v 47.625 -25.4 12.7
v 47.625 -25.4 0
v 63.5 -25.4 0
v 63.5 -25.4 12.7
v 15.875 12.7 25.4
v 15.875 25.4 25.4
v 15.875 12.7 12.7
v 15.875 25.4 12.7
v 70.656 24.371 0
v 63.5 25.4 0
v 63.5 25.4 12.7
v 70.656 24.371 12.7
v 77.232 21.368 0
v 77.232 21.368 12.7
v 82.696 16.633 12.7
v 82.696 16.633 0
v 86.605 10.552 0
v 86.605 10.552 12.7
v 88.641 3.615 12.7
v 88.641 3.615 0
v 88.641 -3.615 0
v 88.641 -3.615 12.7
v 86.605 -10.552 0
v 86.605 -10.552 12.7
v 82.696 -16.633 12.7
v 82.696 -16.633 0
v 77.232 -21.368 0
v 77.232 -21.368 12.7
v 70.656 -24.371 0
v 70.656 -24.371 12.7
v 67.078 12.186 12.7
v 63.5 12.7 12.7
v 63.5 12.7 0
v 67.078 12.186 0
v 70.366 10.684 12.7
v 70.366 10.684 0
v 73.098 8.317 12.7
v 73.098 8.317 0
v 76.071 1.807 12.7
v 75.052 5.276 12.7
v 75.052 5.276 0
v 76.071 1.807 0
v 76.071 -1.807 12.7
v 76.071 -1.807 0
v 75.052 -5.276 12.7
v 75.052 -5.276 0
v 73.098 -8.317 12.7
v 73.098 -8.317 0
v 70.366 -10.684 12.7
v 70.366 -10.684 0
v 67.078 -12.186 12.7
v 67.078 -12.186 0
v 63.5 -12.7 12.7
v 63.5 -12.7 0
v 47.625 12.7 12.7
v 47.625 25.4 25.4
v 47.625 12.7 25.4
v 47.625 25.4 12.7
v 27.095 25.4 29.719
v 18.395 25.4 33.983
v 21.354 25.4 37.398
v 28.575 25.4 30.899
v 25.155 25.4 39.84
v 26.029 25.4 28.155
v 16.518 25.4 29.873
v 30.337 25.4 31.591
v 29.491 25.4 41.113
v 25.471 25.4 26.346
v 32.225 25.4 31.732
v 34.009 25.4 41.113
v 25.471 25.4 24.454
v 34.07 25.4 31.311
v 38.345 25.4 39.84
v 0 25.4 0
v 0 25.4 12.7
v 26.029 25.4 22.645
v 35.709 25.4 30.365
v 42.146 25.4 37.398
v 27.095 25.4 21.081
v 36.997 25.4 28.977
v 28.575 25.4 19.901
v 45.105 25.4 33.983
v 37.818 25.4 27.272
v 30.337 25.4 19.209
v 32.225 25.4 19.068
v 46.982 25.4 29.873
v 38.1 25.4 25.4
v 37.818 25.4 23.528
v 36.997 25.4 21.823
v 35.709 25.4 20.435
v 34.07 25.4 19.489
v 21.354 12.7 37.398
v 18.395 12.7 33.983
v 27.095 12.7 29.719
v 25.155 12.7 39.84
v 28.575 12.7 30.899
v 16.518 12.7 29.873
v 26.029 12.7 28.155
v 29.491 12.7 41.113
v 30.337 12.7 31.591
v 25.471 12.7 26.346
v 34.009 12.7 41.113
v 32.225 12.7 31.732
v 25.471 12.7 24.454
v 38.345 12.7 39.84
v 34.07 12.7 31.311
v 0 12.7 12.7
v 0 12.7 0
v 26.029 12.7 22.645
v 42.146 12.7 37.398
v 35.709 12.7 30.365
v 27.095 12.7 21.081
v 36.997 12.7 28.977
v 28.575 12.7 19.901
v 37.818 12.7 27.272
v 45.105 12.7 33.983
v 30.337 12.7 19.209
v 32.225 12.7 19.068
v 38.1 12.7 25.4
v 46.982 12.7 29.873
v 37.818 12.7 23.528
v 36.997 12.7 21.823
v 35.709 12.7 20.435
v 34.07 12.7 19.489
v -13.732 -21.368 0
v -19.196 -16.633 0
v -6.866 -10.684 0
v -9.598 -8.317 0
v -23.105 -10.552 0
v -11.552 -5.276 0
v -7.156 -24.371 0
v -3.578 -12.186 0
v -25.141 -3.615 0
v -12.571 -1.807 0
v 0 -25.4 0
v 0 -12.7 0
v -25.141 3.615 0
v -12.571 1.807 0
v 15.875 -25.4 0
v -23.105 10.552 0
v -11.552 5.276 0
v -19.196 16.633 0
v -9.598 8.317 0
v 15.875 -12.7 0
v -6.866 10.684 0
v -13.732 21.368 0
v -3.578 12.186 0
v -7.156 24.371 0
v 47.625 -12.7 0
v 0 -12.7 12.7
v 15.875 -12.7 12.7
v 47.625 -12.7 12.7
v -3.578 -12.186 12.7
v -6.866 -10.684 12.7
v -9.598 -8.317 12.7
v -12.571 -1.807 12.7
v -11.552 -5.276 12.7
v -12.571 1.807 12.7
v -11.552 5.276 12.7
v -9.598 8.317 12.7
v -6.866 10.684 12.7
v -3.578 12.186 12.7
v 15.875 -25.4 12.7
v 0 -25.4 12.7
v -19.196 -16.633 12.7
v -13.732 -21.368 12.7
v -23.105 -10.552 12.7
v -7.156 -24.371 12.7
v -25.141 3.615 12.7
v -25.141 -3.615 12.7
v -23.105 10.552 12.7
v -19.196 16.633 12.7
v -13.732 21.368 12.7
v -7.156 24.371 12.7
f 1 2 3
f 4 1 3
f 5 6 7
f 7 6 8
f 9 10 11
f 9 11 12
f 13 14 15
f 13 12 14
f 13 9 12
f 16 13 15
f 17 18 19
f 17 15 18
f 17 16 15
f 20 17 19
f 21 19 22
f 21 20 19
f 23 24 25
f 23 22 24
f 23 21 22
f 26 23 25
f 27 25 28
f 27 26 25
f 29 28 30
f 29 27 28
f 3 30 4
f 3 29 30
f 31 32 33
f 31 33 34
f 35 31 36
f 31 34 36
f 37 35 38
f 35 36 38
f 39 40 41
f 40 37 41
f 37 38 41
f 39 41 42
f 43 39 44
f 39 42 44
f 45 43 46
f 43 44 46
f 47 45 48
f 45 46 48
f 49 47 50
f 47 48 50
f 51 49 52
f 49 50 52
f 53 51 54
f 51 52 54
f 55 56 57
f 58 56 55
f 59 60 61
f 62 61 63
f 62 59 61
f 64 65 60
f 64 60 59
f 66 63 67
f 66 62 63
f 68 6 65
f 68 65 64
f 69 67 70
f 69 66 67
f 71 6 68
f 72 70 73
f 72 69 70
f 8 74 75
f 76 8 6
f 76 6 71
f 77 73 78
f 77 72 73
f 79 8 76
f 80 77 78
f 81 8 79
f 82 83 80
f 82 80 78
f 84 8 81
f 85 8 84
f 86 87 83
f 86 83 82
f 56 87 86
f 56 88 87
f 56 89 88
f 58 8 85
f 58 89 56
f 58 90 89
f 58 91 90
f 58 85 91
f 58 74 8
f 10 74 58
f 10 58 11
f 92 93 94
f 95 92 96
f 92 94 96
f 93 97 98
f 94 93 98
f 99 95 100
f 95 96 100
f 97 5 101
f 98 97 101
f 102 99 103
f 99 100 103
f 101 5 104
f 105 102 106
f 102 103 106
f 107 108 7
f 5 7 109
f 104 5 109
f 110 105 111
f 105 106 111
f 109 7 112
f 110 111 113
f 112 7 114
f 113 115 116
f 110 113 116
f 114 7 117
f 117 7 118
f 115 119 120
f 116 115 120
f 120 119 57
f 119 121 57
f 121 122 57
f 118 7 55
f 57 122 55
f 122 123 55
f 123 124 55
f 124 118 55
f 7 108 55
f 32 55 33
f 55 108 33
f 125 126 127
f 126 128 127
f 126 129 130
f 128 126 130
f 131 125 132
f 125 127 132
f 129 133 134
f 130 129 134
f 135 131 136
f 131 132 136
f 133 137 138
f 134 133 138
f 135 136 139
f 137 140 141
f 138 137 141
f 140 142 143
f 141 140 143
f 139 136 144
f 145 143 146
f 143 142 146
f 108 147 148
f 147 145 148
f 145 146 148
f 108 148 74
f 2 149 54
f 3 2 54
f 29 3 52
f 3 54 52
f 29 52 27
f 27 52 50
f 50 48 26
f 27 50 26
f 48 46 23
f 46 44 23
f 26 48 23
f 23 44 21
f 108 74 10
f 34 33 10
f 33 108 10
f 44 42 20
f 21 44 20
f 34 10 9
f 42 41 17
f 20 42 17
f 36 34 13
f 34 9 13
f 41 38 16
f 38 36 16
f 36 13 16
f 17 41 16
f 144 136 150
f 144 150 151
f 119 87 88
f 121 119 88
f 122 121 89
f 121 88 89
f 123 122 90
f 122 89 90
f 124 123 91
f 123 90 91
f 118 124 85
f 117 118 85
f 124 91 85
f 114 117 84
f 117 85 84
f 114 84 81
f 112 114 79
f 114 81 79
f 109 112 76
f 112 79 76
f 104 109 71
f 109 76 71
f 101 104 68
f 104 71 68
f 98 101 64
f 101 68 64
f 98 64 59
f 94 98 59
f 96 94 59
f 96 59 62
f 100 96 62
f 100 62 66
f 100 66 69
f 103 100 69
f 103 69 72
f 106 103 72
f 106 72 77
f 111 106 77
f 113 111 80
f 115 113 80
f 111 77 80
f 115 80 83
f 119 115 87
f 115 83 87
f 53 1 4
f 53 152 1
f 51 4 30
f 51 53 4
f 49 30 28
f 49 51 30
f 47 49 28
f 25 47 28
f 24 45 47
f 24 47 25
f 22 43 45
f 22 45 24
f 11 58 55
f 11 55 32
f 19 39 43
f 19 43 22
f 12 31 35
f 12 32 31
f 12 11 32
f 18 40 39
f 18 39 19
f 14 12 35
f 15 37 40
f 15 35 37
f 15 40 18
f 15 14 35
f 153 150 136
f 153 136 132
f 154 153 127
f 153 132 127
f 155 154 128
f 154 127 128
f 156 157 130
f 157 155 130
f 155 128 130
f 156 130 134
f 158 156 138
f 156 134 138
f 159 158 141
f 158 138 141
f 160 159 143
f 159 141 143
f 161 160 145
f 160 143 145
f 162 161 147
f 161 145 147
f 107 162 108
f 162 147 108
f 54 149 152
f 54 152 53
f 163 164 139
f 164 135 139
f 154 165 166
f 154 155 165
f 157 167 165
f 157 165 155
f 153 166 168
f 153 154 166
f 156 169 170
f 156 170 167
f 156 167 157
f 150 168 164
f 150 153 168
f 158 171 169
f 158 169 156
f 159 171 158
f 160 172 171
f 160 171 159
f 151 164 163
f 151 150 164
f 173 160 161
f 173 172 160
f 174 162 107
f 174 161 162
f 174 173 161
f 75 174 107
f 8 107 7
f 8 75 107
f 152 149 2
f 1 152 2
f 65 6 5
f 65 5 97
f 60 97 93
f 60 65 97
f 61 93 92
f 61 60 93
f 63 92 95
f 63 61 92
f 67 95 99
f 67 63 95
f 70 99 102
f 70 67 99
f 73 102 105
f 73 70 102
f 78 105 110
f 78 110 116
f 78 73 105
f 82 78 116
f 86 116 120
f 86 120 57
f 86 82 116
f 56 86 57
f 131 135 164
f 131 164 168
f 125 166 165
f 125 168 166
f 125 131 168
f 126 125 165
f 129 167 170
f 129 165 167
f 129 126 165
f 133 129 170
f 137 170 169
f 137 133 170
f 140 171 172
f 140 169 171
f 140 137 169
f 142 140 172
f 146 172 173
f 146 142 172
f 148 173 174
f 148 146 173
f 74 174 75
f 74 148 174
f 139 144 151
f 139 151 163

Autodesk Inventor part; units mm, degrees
ref_plane "YZ Plane" through (0, 0, 0) normal (1, 0, 0) x (0, 1, 0)
ref_plane "XZ Plane" through (0, 0, 0) normal (0, 1, 0) x (-1, 0, 0)
ref_plane "XY Plane" through (0, 0, 0) normal (0, 0, 1) x (1, 0, 0)
sketch "Sketch1" plane through (0, 0, 0) normal (0, 0, 1) x (1, 0, 0)
  arc A0 (0, 12.7) -> (0, -12.7) centre (0, 0) ccw
  arc A1 (0, 25.4) -> (0, -25.4) centre (0, 0) ccw
  arc A2 (63.5, -12.7) -> (63.5, 12.7) centre (63.5, 0) ccw
  arc A3 (63.5, -25.4) -> (63.5, 25.4) centre (63.5, 0) ccw
  line L0 (0, 12.7) -> (63.5, 12.7)
  line L1 (0, -12.7) -> (63.5, -12.7)
  line L2 (0, 25.4) -> (63.5, 25.4)
  line L3 (0, -25.4) -> (63.5, -25.4)
  dimension "d0" = 25.4
  dimension "d1" = 50.8
  dimension "d2" = 25.4
  dimension "d3" = 50.8
  dimension "d4" = 63.5
extrude "Extrusion1" add sketch "Sketch1" along normal blind 12.7
sketch "Sketch2" plane through (0, 0, 12.7) normal (0, 0, 1) x (1, 0, 0)
  line L0 (0, -25.4) -> (63.5, -25.4) projected
  line L1 (31.75, -25.4) -> (31.75, -12.7)
  line L2 (0, -12.7) -> (63.5, -12.7) projected
  line L3 (47.625, -12.7) -> (47.625, -25.4)
  line L4 (95.25, -31.75) -> (95.25, -25.4)
  line L5 (15.875, -12.7) -> (15.875, -25.4)
  line L6 (15.875, -12.7) -> (47.625, -12.7)
  line L7 (15.875, -25.4) -> (47.625, -25.4)
  point P0 (0, 0)
  dimension "d8" = 15.875
  dimension "d9" = 15.875
extrude "Extrusion2" cut sketch "Sketch2" against normal blind 12.7
sketch "Sketch4" plane through (0, 25.4, 0) normal (0, 1, 0) x (1, 0, 0)
  line L0 (63.5, 0) -> (0, 0) projected
  circle A0 centre (31.75, -25.4) radius 6.35
  arc A1 (15.875, -25.4) -> (47.625, -25.4) centre (31.75, -25.4) ccw
  line L1 (15.875, -25.4) -> (15.875, -12.7)
  line L2 (0, -12.7) -> (15.875, -12.7) projected
  line L3 (47.625, -25.4) -> (47.625, -12.7)
  line L4 (0, -12.7) -> (63.5, -12.7) projected
  line L5 (31.75, 0) -> (31.75, -12.7)
  dimension "d15" = 12.7
  dimension "d16" = 31.75
  dimension "d17" = 25.4
  dimension "d20" = 0
extrude "Extrusion3" add sketch "Sketch4" against normal blind 12.7
properties part number "HW 2 Part 4"
